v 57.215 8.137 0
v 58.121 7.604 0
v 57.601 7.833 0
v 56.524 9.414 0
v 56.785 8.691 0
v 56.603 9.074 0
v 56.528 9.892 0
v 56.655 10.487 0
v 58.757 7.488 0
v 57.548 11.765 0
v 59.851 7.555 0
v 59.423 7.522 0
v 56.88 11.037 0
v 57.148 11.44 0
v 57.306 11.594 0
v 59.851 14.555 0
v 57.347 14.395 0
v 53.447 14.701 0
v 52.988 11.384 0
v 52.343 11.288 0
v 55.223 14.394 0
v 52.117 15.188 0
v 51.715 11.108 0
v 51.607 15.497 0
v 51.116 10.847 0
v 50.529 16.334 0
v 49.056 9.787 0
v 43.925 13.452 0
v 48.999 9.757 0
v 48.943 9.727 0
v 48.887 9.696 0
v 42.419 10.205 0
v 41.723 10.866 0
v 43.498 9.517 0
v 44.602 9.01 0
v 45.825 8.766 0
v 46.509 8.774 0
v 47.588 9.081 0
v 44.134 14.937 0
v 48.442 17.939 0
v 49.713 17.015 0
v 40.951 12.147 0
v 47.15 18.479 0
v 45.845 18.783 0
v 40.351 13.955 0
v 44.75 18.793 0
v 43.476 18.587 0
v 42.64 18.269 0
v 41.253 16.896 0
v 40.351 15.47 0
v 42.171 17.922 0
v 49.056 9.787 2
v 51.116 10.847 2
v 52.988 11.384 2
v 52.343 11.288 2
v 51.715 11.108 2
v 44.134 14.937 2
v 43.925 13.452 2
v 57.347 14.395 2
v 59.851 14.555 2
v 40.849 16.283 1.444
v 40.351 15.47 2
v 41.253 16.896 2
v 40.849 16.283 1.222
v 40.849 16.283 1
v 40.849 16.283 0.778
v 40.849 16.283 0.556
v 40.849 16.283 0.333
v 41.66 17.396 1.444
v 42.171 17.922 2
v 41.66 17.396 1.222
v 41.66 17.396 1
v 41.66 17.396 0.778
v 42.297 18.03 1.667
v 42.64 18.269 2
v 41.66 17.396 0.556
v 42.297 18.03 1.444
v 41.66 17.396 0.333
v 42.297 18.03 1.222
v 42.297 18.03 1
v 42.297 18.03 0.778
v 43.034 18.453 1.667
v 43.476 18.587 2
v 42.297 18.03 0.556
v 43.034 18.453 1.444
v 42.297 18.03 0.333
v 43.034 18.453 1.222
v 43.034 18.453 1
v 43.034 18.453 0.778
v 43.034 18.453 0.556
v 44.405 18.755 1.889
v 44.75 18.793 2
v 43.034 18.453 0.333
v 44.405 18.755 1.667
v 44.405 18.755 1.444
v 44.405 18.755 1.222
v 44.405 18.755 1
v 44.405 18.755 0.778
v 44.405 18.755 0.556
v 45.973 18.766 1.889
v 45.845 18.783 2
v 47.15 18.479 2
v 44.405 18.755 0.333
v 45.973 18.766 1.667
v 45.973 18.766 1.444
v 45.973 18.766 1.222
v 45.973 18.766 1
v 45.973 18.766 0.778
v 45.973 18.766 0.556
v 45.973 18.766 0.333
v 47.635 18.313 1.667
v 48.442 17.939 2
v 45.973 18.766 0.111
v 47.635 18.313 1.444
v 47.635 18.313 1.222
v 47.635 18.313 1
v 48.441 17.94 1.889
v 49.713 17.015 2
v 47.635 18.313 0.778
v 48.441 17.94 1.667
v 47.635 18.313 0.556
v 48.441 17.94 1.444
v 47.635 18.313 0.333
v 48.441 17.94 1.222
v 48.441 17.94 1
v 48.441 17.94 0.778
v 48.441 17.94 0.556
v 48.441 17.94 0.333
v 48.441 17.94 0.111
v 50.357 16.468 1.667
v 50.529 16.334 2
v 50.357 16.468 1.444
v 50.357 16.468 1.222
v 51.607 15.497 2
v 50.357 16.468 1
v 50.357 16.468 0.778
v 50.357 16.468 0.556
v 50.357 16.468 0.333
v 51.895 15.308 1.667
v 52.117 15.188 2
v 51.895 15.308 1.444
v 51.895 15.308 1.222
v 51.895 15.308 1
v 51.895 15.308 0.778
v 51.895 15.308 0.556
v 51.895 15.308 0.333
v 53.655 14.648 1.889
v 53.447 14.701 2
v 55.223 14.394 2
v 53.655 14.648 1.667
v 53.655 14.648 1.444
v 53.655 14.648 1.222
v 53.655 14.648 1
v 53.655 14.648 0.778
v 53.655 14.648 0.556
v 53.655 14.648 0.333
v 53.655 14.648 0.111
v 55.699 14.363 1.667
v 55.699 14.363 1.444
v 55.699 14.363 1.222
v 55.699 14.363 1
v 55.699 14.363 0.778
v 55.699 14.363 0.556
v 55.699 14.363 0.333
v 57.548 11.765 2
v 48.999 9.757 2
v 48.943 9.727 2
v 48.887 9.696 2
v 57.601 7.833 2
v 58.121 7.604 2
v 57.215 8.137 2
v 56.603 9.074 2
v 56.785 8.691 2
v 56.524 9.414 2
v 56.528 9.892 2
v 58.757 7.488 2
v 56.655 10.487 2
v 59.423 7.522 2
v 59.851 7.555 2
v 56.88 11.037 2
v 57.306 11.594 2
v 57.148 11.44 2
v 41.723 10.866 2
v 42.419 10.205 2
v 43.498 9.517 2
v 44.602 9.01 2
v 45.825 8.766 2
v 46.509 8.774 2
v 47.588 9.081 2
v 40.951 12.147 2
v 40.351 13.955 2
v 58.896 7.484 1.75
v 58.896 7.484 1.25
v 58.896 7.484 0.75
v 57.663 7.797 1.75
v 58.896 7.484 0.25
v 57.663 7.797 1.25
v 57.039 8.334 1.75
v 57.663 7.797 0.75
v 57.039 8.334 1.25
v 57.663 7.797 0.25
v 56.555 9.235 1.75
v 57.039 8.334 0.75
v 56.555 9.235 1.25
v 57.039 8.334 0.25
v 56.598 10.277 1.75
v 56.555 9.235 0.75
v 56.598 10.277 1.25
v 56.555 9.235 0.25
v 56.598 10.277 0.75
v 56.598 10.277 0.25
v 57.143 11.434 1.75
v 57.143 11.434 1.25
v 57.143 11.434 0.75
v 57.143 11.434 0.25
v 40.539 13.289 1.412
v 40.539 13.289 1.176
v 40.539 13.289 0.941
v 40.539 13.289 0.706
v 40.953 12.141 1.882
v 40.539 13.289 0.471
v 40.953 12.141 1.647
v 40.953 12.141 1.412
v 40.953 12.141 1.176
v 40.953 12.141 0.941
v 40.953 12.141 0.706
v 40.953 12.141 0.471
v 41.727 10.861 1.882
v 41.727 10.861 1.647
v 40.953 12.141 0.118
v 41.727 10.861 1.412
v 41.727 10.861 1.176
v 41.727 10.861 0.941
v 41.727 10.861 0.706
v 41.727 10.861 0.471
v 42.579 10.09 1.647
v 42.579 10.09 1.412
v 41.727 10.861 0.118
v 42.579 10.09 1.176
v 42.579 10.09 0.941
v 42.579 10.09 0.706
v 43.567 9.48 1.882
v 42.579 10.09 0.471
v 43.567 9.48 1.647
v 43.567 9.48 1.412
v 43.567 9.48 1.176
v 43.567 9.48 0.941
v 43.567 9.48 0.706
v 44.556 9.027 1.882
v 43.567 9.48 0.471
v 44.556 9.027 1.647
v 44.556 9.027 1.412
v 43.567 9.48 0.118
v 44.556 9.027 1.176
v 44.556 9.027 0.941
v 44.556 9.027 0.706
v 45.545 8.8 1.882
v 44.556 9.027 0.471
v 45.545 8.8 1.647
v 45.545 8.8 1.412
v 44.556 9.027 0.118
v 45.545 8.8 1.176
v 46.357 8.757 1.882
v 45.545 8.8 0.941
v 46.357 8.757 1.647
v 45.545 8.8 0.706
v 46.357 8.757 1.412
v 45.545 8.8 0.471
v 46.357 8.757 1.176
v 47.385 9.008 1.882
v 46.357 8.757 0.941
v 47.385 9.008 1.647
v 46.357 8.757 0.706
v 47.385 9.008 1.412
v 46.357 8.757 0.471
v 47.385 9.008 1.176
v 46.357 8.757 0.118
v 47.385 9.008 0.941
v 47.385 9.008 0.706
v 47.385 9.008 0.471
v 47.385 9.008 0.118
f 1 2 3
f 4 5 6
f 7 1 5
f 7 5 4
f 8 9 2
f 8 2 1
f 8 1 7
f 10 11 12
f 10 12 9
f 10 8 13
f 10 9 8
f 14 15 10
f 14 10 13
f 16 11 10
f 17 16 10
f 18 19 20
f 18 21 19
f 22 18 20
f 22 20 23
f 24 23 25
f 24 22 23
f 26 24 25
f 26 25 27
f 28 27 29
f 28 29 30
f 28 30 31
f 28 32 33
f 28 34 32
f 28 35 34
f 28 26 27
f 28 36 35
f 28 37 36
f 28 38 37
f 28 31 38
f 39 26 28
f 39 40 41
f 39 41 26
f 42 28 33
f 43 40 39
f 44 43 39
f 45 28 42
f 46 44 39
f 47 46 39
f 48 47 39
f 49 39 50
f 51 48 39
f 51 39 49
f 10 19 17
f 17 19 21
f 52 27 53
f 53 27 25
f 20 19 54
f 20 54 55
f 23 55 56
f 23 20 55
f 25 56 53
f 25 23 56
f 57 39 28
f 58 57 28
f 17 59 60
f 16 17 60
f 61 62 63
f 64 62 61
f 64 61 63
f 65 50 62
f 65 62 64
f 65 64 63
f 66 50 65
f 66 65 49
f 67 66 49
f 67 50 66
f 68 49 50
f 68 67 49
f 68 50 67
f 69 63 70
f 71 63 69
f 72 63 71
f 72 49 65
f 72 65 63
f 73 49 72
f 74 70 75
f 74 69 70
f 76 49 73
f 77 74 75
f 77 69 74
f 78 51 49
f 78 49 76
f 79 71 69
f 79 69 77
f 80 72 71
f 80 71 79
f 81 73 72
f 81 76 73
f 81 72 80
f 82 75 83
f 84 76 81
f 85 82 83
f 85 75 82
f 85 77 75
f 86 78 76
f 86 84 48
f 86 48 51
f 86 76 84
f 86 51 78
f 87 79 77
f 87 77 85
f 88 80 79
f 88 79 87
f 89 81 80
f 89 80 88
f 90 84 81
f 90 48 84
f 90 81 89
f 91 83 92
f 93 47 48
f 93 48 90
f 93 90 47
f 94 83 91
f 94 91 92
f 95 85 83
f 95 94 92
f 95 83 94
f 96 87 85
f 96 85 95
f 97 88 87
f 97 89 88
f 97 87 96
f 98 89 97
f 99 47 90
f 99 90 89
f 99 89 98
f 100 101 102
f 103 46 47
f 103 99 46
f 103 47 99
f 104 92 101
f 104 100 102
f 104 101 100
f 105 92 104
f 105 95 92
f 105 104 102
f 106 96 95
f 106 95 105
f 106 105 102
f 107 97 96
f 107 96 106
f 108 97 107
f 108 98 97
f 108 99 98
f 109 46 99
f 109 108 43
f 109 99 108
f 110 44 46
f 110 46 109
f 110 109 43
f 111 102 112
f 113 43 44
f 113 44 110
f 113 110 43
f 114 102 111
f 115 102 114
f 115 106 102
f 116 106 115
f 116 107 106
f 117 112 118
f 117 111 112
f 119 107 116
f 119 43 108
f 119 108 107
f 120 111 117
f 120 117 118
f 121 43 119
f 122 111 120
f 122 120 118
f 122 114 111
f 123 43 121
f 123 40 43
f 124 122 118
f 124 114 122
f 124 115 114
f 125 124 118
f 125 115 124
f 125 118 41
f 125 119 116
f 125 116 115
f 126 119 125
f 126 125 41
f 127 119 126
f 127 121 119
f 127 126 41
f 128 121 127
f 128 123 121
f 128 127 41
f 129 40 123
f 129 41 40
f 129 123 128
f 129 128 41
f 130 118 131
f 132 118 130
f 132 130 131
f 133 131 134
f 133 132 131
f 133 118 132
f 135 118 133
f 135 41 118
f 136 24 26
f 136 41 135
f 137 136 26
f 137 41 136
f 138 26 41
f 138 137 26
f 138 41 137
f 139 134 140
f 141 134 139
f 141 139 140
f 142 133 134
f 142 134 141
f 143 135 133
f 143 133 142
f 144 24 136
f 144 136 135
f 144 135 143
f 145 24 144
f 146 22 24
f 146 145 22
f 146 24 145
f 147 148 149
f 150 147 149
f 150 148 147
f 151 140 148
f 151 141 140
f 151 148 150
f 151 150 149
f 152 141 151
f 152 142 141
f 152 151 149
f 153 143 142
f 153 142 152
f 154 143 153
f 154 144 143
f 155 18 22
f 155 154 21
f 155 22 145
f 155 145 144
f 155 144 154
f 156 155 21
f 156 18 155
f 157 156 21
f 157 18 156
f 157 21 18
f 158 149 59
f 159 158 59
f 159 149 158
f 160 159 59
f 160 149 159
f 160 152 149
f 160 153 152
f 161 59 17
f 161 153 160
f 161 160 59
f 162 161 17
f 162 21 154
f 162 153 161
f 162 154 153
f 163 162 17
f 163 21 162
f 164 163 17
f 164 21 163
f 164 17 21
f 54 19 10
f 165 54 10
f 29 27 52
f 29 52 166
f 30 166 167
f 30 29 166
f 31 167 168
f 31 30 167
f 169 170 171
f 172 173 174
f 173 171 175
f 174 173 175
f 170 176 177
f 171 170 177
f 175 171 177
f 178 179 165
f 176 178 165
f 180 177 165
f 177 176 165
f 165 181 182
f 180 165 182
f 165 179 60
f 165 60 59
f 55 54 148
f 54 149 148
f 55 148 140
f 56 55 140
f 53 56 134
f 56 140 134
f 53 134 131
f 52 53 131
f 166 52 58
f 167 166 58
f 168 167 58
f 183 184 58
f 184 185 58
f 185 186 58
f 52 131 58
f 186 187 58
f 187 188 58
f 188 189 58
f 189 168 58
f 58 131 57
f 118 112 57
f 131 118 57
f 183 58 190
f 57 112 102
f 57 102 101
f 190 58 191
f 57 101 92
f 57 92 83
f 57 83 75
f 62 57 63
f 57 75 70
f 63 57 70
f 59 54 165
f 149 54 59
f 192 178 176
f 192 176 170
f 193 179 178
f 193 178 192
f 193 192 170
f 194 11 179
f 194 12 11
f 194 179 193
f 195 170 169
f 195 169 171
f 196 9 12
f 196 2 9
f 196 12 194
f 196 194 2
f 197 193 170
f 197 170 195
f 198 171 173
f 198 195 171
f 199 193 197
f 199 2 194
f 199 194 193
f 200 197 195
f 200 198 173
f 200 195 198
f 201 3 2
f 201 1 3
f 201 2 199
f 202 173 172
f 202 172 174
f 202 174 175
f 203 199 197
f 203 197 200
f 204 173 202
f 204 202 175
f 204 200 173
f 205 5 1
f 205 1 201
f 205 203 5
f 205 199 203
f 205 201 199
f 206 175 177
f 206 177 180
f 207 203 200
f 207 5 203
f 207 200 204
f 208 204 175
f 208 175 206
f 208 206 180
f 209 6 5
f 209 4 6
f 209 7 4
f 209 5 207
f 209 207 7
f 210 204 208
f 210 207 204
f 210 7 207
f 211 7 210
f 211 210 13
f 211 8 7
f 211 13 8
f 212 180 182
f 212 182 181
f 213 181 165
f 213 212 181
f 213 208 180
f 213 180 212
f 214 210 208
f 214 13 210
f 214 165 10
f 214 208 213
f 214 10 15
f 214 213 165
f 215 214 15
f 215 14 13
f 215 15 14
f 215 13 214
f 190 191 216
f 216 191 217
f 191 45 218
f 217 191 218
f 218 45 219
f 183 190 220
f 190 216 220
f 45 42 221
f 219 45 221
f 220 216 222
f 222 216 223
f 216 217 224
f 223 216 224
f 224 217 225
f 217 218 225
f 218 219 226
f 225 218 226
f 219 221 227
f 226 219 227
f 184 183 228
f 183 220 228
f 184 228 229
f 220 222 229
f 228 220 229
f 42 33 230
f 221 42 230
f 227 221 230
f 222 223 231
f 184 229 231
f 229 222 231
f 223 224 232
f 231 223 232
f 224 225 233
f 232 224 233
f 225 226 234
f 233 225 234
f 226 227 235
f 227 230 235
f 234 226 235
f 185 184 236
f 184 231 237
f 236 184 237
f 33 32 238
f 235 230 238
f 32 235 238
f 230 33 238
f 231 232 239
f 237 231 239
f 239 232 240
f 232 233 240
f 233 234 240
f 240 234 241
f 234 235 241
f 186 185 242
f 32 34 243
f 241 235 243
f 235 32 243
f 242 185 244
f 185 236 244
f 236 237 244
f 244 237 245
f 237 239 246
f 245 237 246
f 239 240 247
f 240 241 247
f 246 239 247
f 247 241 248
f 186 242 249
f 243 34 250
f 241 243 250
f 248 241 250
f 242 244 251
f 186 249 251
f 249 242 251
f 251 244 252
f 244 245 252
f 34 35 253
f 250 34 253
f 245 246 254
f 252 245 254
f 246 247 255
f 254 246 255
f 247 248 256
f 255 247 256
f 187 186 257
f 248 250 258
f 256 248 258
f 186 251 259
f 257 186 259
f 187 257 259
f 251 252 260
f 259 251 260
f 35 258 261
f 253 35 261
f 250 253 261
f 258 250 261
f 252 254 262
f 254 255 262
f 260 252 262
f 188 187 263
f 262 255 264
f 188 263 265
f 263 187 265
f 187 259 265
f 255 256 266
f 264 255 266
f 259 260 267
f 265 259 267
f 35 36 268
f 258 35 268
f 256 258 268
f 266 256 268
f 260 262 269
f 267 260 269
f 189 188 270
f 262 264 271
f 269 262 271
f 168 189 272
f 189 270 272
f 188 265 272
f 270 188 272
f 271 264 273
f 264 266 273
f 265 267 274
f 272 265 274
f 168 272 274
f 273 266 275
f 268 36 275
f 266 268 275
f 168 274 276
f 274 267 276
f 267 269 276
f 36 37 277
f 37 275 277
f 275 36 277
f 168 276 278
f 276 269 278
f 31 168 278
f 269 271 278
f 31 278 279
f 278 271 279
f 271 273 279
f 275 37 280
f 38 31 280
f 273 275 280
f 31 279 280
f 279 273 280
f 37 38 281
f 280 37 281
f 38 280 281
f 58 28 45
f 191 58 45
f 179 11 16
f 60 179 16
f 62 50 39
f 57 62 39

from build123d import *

# Parameters (mm, degrees)
F1_DEPTH    = 2
F2_T1_DEPTH = 2


# Not quite as in the source:
# - a fillet or chamfer that OpenCascade refuses, or shapes differently, is made with other operations: its cross-section is extruded or revolved along the edge and cut away or added


with BuildPart() as f1:
    # F0 (on Top) → F1 (new body)
    with BuildSketch(Plane.XY):
        with BuildLine():
            add(Edge.make_bspline(
                [(40.3510897258, 15.4700221217), (40.4002790123, 15.5814527788), (40.5765609139, 15.7573002366), (40.8482218334, 16.3030928425), (41.165026275, 16.7963969786), (41.6547225339, 17.4092616999), (42.2848270806, 18.0681197149), (43.024383076, 18.5173006903), (44.4482177174, 18.7966814782), (45.9437204424, 18.8740196912), (47.6474480344, 18.3309181954), (48.4387671563, 17.9801551733), (49.509499414, 17.2200044537), (50.3297293975, 16.4585906766), (51.0929989178, 15.9341416913), (51.8795462786, 15.2096607451), (53.6624560336, 14.5668169621), (55.7284365284, 14.3066111603), (57.3670281795, 14.4035559525), (59.1814684115, 14.4725478471), (59.8510897258, 14.5550060059)],
                knots=[0, 0, 0, 0, 0.0309496374, 0.0705551354, 0.1103078346, 0.1558389635, 0.2046336941, 0.2520602452, 0.3130525572, 0.3774848703, 0.4450313899, 0.4935325314, 0.5516621873, 0.6066818861, 0.6553419578, 0.7076474259, 0.7782054312, 0.8521368249, 0.9197479448, 1, 1, 1, 1], degree=3))
            Line((40.3510897258, 15.4700221217), (44.1344518025, 14.9373847717))
            Line((44.1344518025, 14.9373847717), (43.9253377729, 13.4520325163))
            Line((43.9253377729, 13.4520325163), (40.3510897258, 13.9552299289))
            add(Edge.make_bspline(
                [(40.3510897258, 13.9552299289), (40.380459386, 13.8515658436), (40.4435205062, 13.6292409687), (40.5351157189, 13.2770722669), (40.6975247029, 12.8483958981), (40.9256908997, 12.1137067954), (41.3380196001, 11.4845841437), (41.6991570459, 10.8483582383), (42.1298627814, 10.4186096604), (42.5754983268, 10.0860188118), (43.0629528901, 9.7632613692), (43.5619025736, 9.4761638561), (44.0771300551, 9.2178264046), (44.5526645941, 9.0223320072), (44.9829333509, 8.8809763782), (45.5611643118, 8.794463186), (46.382082494, 8.6943641738), (47.4820612716, 9.0173037656), (48.2852752929, 9.3514047606), (48.9644408226, 9.7399642691)],
                knots=[0, 0, 0, 0, 0.0424345091, 0.0861825949, 0.1357239466, 0.1997680722, 0.264076511, 0.3265344491, 0.3832833697, 0.4377533585, 0.4936679865, 0.5494507655, 0.6052047608, 0.6575157225, 0.7063210351, 0.761825778, 0.8279297926, 0.9033165831, 1, 1, 1, 1], degree=3))
            Line((48.9644408226, 9.7399642691), (51.9989468157, 11.3017885014))
            Line((51.9989468157, 11.3017885014), (57.5477800182, 11.7649970946))
            add(Edge.make_bspline(
                [(59.8510897258, 7.5550060059), (59.7367509498, 7.5817109742), (58.8068931658, 7.3691162235), (57.6316029399, 7.7279038973), (57.0173857229, 8.3014615446), (56.4314344596, 9.210300185), (56.556712226, 10.2745206274), (56.8370016511, 11.0042399426), (57.1435482301, 11.4671570982), (57.3374471588, 11.6295714443), (57.5477800182, 11.7649970946)],
                knots=[0, 0, 0, 0, 0.1328866261, 0.2860615837, 0.4092174064, 0.5466123808, 0.6852473434, 0.8057102912, 0.9017534238, 1, 1, 1, 1], degree=3))
            Line((59.8510897258, 7.5550060059), (59.8510897258, 14.5550060059))
        make_face()
    extrude(amount=F1_DEPTH)

    # F2: fillet of radius 5 on 2 edges, made by hand

    # F2_s2 → F2_t1 (join)
    with BuildSketch(Plane.XY):
        with BuildLine():
            ThreePointArc((52.9883634864, 11.3843835782), (52.0258606682, 11.2079480539), (51.1161547101, 10.8474258784))
            Line((51.1161547101, 10.8474258784), (51.9989468157, 11.3017885014))
            Line((51.9989468157, 11.3017885014), (52.9883634864, 11.3843835782))
        make_face()
        with BuildLine():
            ThreePointArc((49.0557948641, 9.7869831104), (48.9712088199, 9.7424196411), (48.8874903164, 9.6962469887))
            ThreePointArc((48.8874903164, 9.6962469887), (48.9259988454, 9.7180470594), (48.9644408226, 9.7399642691))
            Line((48.9644408226, 9.7399642691), (49.0557948641, 9.7869831104))
        make_face()
    extrude(amount=F2_T1_DEPTH)


solid = f1.part
